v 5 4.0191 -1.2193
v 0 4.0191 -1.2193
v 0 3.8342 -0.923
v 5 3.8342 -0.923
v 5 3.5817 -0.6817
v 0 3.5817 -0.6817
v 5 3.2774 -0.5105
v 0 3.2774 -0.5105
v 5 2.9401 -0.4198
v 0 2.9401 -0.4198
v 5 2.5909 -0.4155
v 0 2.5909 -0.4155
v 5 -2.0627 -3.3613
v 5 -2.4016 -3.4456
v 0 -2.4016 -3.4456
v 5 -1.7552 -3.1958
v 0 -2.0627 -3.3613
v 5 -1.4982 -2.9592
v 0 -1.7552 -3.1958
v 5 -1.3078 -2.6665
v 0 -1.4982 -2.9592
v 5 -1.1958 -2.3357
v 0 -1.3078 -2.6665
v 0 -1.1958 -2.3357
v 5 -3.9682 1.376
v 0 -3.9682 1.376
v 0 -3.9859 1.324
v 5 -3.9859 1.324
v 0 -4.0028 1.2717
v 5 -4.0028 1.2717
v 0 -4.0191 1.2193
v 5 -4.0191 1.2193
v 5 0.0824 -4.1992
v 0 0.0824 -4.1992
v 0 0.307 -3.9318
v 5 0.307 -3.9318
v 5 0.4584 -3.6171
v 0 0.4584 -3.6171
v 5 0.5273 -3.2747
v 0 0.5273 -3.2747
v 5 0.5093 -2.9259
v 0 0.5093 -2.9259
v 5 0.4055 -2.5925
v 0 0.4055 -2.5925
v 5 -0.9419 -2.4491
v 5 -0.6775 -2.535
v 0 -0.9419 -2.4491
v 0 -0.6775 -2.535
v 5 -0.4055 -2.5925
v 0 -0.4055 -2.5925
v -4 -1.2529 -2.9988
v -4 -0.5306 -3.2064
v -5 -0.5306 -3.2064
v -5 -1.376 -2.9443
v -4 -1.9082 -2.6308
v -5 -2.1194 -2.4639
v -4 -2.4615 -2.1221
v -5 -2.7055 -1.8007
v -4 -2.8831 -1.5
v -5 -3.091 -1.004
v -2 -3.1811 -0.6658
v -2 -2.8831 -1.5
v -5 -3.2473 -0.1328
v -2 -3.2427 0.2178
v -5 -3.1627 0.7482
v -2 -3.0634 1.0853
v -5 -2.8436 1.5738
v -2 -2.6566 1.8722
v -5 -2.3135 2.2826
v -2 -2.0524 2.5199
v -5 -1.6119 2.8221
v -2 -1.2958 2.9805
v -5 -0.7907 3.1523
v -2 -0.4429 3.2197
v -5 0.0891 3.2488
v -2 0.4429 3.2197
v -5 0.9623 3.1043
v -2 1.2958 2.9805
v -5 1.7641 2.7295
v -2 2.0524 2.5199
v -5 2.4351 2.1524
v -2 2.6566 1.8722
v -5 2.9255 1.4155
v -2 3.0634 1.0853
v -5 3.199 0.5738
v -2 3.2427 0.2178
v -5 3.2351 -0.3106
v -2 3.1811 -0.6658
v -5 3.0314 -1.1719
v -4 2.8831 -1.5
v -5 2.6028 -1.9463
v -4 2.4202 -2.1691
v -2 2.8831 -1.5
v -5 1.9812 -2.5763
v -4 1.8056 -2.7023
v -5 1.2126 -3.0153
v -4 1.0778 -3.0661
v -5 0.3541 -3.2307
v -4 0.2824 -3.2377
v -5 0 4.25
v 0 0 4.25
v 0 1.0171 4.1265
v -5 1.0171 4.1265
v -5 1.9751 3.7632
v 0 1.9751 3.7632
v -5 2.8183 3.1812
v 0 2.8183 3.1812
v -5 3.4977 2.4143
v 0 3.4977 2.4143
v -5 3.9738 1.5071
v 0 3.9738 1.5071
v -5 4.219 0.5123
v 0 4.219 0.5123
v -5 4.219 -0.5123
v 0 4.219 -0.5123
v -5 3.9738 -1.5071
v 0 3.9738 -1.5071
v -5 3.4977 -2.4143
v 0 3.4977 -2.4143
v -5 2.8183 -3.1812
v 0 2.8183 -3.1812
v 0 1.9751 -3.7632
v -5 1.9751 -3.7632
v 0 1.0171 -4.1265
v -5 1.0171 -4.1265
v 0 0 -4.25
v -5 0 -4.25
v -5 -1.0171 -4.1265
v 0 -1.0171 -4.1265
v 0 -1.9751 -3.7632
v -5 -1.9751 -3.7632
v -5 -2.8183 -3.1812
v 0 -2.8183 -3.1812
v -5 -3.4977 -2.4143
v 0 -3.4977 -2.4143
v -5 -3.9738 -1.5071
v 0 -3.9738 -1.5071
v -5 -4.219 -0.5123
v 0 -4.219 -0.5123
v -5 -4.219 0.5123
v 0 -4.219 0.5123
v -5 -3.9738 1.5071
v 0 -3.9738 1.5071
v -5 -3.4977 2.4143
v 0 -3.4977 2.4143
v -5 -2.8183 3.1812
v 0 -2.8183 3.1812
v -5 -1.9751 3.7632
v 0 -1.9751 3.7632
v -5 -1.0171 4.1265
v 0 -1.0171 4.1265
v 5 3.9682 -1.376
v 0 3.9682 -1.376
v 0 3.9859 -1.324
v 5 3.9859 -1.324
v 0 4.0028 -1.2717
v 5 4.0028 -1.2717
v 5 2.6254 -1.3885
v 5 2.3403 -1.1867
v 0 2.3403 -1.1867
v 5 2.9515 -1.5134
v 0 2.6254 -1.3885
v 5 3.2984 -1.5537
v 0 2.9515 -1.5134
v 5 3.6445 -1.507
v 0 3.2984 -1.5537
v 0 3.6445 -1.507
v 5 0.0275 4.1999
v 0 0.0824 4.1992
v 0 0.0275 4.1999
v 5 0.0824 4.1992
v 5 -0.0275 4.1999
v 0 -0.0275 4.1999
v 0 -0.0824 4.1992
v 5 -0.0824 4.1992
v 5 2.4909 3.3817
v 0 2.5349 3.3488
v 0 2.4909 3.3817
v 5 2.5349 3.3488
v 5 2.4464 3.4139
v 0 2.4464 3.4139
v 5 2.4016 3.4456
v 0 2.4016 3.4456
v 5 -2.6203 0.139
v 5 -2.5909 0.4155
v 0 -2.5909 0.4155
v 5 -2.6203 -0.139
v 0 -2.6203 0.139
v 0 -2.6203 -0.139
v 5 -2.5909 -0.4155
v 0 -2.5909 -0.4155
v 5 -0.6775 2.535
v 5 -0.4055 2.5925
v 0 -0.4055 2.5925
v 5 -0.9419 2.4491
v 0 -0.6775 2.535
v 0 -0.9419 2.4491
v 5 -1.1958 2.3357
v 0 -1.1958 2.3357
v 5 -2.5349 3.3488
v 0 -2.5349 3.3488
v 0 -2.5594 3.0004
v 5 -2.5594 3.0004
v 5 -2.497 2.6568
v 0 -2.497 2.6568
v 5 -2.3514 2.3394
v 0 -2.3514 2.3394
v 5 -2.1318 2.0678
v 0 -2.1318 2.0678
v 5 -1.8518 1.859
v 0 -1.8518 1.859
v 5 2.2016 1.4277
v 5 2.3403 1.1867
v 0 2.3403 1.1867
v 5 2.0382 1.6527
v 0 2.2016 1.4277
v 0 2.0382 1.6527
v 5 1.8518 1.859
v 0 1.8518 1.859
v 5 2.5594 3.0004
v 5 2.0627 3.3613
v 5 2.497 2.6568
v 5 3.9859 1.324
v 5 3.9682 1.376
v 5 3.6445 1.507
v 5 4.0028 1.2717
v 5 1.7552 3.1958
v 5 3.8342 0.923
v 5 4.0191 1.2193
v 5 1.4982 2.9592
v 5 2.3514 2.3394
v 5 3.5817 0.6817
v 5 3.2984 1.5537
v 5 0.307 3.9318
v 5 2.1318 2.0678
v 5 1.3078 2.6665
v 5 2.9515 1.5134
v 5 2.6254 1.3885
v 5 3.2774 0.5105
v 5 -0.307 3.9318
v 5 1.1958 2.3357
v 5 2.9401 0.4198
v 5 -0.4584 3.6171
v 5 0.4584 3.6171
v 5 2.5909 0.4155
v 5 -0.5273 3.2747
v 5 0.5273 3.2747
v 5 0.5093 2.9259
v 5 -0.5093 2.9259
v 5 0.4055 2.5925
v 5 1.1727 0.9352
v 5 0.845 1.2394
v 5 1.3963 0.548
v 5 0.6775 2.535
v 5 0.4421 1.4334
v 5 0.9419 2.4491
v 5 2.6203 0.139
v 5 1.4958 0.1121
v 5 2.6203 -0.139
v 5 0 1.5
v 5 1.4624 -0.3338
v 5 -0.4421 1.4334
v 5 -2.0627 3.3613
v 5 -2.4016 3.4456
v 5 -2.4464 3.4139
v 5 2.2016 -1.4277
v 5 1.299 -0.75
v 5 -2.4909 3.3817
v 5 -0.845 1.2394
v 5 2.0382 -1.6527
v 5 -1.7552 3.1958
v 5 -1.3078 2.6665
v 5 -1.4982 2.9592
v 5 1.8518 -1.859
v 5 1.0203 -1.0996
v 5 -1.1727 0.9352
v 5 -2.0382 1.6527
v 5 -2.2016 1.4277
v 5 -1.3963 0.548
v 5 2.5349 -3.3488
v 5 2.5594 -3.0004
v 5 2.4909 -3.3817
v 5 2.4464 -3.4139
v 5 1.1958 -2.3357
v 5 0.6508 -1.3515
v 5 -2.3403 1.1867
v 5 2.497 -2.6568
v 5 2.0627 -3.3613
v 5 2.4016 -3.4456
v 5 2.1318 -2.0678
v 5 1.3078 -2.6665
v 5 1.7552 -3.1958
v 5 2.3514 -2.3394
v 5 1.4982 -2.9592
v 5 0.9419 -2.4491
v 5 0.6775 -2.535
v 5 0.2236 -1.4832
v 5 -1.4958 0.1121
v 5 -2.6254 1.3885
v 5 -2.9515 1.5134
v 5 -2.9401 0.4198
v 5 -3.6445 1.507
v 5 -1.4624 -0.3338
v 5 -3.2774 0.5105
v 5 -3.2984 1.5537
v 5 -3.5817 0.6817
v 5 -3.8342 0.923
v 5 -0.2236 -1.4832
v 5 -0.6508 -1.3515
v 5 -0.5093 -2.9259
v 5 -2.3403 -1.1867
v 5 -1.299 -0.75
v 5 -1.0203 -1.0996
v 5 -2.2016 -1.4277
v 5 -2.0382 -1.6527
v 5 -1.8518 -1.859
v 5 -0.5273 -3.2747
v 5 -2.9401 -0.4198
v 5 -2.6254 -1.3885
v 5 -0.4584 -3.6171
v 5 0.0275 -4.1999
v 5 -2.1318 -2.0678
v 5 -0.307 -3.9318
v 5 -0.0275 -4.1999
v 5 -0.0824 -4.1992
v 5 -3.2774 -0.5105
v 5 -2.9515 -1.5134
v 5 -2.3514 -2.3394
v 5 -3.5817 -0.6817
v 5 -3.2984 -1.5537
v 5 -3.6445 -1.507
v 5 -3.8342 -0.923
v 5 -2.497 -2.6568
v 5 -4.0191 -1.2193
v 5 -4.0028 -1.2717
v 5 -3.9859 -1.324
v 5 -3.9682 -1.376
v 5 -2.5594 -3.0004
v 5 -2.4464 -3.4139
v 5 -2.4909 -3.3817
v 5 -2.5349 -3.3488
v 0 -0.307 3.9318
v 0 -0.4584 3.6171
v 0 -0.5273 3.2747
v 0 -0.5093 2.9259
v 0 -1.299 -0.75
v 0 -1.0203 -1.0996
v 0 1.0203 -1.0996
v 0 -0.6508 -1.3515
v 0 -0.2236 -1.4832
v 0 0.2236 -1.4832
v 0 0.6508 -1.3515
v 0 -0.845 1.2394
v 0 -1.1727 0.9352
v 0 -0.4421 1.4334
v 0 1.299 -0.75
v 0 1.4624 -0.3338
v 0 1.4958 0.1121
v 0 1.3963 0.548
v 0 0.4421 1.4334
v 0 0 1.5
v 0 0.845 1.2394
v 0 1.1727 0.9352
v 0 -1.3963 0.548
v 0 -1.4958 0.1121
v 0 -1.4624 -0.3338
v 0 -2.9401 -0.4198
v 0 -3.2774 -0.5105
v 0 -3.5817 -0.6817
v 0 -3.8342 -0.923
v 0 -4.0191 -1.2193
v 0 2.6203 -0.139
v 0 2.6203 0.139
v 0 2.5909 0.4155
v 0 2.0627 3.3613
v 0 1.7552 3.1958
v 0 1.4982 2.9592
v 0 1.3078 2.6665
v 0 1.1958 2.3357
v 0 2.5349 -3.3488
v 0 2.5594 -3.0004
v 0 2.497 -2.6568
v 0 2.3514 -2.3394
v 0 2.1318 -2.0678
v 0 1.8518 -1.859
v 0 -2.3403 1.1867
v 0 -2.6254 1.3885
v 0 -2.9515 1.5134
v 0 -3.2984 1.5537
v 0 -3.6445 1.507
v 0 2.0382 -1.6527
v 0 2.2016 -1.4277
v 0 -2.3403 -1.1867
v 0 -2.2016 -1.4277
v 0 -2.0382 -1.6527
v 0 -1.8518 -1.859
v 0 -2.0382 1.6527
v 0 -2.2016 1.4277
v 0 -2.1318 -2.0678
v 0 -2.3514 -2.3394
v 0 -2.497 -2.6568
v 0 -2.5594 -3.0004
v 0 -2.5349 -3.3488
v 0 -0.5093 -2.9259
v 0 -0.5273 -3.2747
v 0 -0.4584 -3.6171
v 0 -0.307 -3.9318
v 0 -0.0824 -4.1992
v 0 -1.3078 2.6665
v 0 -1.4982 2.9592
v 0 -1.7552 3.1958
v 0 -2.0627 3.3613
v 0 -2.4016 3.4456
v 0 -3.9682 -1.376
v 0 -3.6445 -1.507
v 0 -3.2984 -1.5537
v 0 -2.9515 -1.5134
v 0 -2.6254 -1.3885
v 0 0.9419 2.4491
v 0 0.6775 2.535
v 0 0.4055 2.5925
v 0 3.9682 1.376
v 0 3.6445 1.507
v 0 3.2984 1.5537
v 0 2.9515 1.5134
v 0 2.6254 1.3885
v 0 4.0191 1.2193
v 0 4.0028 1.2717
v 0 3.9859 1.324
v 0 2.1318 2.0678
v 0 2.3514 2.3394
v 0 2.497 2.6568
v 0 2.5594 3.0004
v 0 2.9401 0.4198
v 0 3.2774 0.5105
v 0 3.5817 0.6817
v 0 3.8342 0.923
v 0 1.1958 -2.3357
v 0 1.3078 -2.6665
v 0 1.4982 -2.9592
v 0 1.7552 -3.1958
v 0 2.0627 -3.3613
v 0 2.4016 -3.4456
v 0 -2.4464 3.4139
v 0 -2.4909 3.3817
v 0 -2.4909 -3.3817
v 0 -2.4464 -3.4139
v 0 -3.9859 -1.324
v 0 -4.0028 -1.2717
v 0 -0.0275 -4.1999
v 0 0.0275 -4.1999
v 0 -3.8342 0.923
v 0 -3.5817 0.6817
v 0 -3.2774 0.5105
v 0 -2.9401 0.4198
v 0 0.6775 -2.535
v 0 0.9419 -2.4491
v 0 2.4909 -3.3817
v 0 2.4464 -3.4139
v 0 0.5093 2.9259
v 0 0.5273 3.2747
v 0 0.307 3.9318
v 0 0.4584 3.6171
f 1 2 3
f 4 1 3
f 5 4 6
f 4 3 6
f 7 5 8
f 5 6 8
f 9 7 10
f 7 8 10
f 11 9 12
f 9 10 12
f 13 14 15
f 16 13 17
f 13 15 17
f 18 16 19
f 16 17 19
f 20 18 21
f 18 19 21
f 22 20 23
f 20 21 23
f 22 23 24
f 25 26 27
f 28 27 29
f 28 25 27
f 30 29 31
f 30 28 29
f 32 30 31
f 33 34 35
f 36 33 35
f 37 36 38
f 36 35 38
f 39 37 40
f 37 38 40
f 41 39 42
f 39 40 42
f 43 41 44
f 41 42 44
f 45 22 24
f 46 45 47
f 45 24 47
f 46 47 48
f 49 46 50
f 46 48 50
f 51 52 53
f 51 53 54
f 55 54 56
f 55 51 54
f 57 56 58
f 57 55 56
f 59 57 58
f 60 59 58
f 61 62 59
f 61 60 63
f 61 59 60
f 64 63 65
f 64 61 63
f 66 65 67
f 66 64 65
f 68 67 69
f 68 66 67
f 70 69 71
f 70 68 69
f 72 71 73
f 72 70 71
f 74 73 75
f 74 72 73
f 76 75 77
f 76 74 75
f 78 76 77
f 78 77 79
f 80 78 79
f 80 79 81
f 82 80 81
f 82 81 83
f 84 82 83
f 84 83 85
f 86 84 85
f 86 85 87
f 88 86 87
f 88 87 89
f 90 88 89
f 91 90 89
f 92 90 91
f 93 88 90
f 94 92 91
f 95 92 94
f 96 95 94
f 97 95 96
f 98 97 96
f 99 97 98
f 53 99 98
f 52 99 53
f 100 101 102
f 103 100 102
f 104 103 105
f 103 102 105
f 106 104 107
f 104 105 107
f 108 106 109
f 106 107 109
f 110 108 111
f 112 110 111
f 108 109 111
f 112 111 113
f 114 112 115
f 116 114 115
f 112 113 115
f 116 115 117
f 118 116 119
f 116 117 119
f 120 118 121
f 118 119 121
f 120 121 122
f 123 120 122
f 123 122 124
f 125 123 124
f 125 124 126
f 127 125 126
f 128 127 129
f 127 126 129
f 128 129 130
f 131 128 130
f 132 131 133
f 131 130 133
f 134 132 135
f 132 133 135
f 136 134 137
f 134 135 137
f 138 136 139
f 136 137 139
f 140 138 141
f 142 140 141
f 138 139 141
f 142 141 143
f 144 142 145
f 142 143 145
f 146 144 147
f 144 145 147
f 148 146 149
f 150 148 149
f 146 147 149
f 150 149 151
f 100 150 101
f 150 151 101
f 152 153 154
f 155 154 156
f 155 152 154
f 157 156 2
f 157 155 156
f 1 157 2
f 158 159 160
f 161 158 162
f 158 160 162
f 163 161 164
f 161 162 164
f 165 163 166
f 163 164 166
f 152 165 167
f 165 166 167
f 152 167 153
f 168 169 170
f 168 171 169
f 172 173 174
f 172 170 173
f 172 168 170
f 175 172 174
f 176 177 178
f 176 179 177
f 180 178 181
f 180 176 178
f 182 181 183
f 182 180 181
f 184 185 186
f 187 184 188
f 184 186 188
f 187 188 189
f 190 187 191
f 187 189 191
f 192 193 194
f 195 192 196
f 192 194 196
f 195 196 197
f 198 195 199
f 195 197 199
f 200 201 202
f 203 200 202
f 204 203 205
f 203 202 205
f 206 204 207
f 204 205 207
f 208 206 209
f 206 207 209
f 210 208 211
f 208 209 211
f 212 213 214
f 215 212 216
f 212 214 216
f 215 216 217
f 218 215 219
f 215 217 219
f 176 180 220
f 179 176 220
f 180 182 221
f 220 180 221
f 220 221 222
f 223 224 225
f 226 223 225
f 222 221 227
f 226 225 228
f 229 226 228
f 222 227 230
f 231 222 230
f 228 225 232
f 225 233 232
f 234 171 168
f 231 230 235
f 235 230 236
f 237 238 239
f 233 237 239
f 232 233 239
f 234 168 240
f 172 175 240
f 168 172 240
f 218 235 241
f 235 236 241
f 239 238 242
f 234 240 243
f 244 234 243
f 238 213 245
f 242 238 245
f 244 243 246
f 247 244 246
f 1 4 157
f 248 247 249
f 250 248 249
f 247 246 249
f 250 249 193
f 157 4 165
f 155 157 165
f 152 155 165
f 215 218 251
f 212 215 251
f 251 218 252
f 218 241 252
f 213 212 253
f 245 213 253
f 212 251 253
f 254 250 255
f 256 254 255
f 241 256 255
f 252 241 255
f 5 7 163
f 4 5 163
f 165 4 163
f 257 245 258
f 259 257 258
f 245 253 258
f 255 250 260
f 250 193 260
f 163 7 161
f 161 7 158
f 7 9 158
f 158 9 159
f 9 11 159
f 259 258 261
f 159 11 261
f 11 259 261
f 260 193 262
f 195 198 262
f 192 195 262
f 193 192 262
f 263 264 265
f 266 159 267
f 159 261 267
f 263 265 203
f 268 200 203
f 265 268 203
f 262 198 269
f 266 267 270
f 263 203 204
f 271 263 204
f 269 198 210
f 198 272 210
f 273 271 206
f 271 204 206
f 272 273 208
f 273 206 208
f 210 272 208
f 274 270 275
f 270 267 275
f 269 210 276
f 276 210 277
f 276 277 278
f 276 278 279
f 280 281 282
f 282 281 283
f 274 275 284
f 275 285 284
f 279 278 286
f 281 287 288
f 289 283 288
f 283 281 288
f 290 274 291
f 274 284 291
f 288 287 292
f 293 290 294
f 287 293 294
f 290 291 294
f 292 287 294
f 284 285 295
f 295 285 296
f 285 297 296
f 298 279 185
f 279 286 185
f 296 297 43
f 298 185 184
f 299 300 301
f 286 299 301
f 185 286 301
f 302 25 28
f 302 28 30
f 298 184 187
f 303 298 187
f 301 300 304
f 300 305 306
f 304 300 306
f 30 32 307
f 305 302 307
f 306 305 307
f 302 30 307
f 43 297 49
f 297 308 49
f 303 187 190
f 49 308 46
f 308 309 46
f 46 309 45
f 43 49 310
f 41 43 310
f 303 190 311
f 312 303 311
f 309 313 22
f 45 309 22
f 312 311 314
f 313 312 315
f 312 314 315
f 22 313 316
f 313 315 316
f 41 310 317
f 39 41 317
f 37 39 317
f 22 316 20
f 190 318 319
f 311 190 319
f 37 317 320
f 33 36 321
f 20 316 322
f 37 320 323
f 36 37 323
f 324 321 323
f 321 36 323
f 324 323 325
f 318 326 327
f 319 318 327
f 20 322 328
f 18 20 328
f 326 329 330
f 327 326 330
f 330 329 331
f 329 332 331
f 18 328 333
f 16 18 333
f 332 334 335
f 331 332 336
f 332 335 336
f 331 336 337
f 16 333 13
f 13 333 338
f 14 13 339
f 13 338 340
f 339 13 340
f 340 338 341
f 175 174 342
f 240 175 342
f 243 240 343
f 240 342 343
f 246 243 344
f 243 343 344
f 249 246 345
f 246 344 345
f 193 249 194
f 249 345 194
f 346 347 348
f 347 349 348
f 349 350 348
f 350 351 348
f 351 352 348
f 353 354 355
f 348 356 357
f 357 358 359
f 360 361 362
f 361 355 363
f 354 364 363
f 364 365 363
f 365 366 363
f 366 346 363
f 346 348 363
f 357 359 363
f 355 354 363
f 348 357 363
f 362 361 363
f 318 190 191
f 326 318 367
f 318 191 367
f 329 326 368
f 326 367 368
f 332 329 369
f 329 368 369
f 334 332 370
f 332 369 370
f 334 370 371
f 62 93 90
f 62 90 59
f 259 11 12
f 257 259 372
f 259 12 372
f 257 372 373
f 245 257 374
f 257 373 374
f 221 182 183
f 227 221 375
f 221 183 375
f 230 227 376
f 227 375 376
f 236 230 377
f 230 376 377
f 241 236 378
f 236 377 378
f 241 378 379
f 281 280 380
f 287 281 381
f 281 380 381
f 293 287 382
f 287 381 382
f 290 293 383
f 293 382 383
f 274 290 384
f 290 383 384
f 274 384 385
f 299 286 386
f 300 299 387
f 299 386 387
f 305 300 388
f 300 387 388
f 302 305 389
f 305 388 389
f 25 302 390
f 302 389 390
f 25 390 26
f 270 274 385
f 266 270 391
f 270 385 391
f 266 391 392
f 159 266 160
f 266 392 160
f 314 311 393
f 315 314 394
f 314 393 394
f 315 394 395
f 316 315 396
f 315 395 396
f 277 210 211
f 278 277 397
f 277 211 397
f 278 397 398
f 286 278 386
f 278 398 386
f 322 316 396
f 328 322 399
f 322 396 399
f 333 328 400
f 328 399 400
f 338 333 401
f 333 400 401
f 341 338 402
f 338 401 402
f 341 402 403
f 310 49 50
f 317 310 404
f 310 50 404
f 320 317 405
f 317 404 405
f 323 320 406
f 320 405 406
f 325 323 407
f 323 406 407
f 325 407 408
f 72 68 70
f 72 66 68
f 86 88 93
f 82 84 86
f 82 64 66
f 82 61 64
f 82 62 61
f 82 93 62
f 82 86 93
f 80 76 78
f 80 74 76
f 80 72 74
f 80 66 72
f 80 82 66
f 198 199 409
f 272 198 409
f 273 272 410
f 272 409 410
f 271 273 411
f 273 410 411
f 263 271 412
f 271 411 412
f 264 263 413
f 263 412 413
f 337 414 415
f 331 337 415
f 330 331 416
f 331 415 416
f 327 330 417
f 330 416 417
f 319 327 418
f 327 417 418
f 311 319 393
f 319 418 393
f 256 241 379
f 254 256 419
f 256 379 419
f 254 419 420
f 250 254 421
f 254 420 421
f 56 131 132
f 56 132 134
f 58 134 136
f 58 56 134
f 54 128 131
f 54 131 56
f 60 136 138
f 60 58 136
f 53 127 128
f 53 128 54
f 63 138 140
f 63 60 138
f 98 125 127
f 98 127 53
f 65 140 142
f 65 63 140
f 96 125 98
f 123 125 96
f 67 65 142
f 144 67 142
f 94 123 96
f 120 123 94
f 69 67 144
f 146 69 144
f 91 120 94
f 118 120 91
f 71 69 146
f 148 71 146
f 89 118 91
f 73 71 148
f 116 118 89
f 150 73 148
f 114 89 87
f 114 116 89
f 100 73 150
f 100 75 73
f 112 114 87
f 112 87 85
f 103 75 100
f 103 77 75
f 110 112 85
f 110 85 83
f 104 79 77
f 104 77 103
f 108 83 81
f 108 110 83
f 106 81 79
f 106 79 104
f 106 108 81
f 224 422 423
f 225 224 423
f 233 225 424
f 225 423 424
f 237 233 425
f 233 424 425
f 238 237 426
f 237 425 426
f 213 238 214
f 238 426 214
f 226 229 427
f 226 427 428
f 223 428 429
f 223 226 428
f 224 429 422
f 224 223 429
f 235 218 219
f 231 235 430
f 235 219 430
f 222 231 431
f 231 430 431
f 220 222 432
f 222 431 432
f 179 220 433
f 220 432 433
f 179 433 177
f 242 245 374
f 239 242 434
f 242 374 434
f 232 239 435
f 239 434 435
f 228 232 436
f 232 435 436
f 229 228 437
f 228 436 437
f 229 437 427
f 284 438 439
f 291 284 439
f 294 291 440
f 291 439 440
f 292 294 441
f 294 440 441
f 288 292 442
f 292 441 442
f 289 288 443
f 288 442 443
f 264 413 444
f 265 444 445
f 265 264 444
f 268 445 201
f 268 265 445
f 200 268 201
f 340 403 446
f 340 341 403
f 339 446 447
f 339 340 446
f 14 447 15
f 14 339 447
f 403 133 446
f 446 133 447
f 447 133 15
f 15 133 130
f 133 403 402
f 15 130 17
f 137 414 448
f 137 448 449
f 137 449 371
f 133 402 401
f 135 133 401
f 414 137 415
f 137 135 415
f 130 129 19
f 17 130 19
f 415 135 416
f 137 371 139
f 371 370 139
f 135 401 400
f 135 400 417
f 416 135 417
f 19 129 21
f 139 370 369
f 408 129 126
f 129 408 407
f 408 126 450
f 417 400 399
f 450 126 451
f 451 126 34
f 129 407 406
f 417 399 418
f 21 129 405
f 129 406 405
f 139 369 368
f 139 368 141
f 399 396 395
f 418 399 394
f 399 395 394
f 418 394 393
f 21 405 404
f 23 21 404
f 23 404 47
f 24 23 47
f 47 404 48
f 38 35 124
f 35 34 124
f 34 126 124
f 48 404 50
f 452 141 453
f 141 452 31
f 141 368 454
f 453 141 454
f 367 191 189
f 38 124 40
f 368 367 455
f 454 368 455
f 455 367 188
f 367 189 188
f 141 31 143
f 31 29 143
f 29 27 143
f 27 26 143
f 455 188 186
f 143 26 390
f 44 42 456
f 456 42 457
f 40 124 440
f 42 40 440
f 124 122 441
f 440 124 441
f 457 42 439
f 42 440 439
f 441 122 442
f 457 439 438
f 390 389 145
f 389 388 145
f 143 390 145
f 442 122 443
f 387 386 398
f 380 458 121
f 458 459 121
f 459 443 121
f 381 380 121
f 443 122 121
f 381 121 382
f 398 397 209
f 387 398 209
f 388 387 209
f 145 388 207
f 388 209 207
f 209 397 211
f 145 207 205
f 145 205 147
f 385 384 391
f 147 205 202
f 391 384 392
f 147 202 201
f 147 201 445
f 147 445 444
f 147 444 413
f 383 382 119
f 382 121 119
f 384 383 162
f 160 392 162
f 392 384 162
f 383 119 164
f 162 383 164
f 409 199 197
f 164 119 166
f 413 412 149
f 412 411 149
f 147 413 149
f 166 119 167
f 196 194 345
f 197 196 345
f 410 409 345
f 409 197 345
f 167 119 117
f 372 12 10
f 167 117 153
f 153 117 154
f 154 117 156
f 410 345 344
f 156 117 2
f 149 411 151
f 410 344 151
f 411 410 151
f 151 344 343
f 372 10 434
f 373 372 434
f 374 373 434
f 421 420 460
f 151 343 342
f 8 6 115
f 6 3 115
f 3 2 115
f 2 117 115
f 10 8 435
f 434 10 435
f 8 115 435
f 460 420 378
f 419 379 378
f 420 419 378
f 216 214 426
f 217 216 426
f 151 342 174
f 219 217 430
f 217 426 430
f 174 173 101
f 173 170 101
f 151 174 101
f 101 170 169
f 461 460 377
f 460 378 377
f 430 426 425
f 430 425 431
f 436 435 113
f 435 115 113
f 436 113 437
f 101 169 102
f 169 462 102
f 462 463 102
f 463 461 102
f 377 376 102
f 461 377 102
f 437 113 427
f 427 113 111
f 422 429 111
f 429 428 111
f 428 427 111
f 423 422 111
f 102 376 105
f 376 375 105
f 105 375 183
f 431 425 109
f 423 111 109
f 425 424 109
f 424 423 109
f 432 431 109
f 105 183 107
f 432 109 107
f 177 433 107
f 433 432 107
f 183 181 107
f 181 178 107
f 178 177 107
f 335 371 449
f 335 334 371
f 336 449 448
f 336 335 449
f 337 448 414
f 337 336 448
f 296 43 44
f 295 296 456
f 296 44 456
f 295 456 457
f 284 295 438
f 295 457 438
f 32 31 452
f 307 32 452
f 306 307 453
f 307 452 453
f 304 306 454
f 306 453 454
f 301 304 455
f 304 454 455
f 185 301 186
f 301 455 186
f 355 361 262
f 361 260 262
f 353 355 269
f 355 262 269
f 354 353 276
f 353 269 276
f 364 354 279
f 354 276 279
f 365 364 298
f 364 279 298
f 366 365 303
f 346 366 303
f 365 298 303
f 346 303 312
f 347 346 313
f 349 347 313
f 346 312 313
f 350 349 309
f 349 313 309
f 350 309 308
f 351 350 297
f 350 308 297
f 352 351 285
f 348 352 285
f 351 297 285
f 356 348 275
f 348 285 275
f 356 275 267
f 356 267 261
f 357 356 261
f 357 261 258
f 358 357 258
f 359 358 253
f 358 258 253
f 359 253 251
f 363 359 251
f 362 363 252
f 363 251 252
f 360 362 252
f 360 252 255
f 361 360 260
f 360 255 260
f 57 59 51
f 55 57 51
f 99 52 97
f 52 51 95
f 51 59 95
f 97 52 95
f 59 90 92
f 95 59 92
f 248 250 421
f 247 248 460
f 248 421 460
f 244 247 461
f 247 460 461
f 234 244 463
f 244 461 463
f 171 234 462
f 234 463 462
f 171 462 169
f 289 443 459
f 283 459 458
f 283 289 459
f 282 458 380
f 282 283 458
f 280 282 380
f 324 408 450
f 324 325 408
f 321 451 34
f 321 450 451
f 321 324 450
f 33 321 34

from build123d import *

# Parameters (mm, degrees)
BASPROSKE_W             = 5
BASPROSKE_H             = 4.2
TOOTHCUT_DEPTH          = 8.764019578
TEETHCUTS_COUNT         = 10
TEETHCUTS_ANGLE         = 324
BORSKE_R                = 1.5
BORE_DEPTH              = 50.0000508
CROQUIS1_R              = 4.25
CROQUIS1_R_2            = 3.25
SALIENTE_EXTRUIR1_DEPTH = 5
CROQUIS2_R              = 3.25
SALIENTE_EXTRUIR2_DEPTH = 2
SALIENTE_EXTRUIR3_DEPTH = 2


with BuildPart() as part:
    # BasProSke → Base-Revolve (revolve)
    with BuildSketch(Plane(origin=(0, 0, 0), x_dir=(1, 0, 0), z_dir=(0, 1, 0)), mode=Mode.PRIVATE) as base_revolve_sk:
        with Locations((2.5, 2.1)):
            Rectangle(BASPROSKE_W, BASPROSKE_H)
    revolve(base_revolve_sk.sketch.rotate(Axis((-10, 0, 0), (1, 0, 0)), 180), axis=Axis((-10, 0, 0), (1, 0, 0)))

    # TooCutSke → ToothCut (cut, through all)
    with BuildSketch(Plane(origin=(0, 0, 0), x_dir=(0, 0, -1), z_dir=(1, 0, 0))):
        with BuildLine():
            ThreePointArc((0.415506654, 2.590893711), (0, 2.624), (-0.415506654, 2.590893711))
            ThreePointArc((-0.415506654, 2.590893711), (-0.596160737, 3.451685568), (-1.254578949, 4.034852763))
            ThreePointArc((-1.254578949, 4.034852763), (0, 4.2254), (1.254578949, 4.034852763))
            ThreePointArc((1.254578949, 4.034852763), (0.596160737, 3.451685568), (0.415506654, 2.590893711))
        make_face()
    toothcut = extrude(amount=TOOTHCUT_DEPTH, mode=Mode.SUBTRACT)

    # TeethCuts: ToothCut ×10 about axis
    teethcuts_axis = Axis((-10, 0, 0), (1, 0, 0))
    for i in range(1, TEETHCUTS_COUNT):
        add(toothcut.rotate(teethcuts_axis, i * TEETHCUTS_ANGLE / (TEETHCUTS_COUNT - 1)), mode=Mode.SUBTRACT)

    # BorSke → Bore (cut, symmetric)
    with BuildSketch(Plane(origin=(0, 0, 0), x_dir=(0, 0, -1), z_dir=(1, 0, 0))):
        with Locations(Location((0, 0, 0), (0, 0, 180))):
            Circle(BORSKE_R)
    extrude(amount=BORE_DEPTH, both=True, mode=Mode.SUBTRACT)

    # Croquis1 → Saliente-Extruir1 (add)
    with BuildSketch(Plane.ZY):
        Circle(CROQUIS1_R)
        with Locations(Location((0, 0, 0), (0, 0, 189.396976621))):
            Circle(CROQUIS1_R_2, mode=Mode.SUBTRACT)
    extrude(amount=SALIENTE_EXTRUIR1_DEPTH)

    # Croquis2 → Saliente-Extruir2 (add)
    with BuildSketch(Plane.ZY):
        Circle(CROQUIS2_R)
    extrude(amount=SALIENTE_EXTRUIR2_DEPTH)

    # Croquis3 → Saliente-Extruir3 (add)
    with BuildSketch(Plane.ZY.offset(2)):
        with BuildLine():
            Line((-1.5, 2.883140649), (-1.5, -2.883140649))
            ThreePointArc((-1.5, -2.883140649), (-3.25, 0), (-1.5, 2.883140649))
        make_face()
    extrude(amount=SALIENTE_EXTRUIR3_DEPTH)


solid = part.part
